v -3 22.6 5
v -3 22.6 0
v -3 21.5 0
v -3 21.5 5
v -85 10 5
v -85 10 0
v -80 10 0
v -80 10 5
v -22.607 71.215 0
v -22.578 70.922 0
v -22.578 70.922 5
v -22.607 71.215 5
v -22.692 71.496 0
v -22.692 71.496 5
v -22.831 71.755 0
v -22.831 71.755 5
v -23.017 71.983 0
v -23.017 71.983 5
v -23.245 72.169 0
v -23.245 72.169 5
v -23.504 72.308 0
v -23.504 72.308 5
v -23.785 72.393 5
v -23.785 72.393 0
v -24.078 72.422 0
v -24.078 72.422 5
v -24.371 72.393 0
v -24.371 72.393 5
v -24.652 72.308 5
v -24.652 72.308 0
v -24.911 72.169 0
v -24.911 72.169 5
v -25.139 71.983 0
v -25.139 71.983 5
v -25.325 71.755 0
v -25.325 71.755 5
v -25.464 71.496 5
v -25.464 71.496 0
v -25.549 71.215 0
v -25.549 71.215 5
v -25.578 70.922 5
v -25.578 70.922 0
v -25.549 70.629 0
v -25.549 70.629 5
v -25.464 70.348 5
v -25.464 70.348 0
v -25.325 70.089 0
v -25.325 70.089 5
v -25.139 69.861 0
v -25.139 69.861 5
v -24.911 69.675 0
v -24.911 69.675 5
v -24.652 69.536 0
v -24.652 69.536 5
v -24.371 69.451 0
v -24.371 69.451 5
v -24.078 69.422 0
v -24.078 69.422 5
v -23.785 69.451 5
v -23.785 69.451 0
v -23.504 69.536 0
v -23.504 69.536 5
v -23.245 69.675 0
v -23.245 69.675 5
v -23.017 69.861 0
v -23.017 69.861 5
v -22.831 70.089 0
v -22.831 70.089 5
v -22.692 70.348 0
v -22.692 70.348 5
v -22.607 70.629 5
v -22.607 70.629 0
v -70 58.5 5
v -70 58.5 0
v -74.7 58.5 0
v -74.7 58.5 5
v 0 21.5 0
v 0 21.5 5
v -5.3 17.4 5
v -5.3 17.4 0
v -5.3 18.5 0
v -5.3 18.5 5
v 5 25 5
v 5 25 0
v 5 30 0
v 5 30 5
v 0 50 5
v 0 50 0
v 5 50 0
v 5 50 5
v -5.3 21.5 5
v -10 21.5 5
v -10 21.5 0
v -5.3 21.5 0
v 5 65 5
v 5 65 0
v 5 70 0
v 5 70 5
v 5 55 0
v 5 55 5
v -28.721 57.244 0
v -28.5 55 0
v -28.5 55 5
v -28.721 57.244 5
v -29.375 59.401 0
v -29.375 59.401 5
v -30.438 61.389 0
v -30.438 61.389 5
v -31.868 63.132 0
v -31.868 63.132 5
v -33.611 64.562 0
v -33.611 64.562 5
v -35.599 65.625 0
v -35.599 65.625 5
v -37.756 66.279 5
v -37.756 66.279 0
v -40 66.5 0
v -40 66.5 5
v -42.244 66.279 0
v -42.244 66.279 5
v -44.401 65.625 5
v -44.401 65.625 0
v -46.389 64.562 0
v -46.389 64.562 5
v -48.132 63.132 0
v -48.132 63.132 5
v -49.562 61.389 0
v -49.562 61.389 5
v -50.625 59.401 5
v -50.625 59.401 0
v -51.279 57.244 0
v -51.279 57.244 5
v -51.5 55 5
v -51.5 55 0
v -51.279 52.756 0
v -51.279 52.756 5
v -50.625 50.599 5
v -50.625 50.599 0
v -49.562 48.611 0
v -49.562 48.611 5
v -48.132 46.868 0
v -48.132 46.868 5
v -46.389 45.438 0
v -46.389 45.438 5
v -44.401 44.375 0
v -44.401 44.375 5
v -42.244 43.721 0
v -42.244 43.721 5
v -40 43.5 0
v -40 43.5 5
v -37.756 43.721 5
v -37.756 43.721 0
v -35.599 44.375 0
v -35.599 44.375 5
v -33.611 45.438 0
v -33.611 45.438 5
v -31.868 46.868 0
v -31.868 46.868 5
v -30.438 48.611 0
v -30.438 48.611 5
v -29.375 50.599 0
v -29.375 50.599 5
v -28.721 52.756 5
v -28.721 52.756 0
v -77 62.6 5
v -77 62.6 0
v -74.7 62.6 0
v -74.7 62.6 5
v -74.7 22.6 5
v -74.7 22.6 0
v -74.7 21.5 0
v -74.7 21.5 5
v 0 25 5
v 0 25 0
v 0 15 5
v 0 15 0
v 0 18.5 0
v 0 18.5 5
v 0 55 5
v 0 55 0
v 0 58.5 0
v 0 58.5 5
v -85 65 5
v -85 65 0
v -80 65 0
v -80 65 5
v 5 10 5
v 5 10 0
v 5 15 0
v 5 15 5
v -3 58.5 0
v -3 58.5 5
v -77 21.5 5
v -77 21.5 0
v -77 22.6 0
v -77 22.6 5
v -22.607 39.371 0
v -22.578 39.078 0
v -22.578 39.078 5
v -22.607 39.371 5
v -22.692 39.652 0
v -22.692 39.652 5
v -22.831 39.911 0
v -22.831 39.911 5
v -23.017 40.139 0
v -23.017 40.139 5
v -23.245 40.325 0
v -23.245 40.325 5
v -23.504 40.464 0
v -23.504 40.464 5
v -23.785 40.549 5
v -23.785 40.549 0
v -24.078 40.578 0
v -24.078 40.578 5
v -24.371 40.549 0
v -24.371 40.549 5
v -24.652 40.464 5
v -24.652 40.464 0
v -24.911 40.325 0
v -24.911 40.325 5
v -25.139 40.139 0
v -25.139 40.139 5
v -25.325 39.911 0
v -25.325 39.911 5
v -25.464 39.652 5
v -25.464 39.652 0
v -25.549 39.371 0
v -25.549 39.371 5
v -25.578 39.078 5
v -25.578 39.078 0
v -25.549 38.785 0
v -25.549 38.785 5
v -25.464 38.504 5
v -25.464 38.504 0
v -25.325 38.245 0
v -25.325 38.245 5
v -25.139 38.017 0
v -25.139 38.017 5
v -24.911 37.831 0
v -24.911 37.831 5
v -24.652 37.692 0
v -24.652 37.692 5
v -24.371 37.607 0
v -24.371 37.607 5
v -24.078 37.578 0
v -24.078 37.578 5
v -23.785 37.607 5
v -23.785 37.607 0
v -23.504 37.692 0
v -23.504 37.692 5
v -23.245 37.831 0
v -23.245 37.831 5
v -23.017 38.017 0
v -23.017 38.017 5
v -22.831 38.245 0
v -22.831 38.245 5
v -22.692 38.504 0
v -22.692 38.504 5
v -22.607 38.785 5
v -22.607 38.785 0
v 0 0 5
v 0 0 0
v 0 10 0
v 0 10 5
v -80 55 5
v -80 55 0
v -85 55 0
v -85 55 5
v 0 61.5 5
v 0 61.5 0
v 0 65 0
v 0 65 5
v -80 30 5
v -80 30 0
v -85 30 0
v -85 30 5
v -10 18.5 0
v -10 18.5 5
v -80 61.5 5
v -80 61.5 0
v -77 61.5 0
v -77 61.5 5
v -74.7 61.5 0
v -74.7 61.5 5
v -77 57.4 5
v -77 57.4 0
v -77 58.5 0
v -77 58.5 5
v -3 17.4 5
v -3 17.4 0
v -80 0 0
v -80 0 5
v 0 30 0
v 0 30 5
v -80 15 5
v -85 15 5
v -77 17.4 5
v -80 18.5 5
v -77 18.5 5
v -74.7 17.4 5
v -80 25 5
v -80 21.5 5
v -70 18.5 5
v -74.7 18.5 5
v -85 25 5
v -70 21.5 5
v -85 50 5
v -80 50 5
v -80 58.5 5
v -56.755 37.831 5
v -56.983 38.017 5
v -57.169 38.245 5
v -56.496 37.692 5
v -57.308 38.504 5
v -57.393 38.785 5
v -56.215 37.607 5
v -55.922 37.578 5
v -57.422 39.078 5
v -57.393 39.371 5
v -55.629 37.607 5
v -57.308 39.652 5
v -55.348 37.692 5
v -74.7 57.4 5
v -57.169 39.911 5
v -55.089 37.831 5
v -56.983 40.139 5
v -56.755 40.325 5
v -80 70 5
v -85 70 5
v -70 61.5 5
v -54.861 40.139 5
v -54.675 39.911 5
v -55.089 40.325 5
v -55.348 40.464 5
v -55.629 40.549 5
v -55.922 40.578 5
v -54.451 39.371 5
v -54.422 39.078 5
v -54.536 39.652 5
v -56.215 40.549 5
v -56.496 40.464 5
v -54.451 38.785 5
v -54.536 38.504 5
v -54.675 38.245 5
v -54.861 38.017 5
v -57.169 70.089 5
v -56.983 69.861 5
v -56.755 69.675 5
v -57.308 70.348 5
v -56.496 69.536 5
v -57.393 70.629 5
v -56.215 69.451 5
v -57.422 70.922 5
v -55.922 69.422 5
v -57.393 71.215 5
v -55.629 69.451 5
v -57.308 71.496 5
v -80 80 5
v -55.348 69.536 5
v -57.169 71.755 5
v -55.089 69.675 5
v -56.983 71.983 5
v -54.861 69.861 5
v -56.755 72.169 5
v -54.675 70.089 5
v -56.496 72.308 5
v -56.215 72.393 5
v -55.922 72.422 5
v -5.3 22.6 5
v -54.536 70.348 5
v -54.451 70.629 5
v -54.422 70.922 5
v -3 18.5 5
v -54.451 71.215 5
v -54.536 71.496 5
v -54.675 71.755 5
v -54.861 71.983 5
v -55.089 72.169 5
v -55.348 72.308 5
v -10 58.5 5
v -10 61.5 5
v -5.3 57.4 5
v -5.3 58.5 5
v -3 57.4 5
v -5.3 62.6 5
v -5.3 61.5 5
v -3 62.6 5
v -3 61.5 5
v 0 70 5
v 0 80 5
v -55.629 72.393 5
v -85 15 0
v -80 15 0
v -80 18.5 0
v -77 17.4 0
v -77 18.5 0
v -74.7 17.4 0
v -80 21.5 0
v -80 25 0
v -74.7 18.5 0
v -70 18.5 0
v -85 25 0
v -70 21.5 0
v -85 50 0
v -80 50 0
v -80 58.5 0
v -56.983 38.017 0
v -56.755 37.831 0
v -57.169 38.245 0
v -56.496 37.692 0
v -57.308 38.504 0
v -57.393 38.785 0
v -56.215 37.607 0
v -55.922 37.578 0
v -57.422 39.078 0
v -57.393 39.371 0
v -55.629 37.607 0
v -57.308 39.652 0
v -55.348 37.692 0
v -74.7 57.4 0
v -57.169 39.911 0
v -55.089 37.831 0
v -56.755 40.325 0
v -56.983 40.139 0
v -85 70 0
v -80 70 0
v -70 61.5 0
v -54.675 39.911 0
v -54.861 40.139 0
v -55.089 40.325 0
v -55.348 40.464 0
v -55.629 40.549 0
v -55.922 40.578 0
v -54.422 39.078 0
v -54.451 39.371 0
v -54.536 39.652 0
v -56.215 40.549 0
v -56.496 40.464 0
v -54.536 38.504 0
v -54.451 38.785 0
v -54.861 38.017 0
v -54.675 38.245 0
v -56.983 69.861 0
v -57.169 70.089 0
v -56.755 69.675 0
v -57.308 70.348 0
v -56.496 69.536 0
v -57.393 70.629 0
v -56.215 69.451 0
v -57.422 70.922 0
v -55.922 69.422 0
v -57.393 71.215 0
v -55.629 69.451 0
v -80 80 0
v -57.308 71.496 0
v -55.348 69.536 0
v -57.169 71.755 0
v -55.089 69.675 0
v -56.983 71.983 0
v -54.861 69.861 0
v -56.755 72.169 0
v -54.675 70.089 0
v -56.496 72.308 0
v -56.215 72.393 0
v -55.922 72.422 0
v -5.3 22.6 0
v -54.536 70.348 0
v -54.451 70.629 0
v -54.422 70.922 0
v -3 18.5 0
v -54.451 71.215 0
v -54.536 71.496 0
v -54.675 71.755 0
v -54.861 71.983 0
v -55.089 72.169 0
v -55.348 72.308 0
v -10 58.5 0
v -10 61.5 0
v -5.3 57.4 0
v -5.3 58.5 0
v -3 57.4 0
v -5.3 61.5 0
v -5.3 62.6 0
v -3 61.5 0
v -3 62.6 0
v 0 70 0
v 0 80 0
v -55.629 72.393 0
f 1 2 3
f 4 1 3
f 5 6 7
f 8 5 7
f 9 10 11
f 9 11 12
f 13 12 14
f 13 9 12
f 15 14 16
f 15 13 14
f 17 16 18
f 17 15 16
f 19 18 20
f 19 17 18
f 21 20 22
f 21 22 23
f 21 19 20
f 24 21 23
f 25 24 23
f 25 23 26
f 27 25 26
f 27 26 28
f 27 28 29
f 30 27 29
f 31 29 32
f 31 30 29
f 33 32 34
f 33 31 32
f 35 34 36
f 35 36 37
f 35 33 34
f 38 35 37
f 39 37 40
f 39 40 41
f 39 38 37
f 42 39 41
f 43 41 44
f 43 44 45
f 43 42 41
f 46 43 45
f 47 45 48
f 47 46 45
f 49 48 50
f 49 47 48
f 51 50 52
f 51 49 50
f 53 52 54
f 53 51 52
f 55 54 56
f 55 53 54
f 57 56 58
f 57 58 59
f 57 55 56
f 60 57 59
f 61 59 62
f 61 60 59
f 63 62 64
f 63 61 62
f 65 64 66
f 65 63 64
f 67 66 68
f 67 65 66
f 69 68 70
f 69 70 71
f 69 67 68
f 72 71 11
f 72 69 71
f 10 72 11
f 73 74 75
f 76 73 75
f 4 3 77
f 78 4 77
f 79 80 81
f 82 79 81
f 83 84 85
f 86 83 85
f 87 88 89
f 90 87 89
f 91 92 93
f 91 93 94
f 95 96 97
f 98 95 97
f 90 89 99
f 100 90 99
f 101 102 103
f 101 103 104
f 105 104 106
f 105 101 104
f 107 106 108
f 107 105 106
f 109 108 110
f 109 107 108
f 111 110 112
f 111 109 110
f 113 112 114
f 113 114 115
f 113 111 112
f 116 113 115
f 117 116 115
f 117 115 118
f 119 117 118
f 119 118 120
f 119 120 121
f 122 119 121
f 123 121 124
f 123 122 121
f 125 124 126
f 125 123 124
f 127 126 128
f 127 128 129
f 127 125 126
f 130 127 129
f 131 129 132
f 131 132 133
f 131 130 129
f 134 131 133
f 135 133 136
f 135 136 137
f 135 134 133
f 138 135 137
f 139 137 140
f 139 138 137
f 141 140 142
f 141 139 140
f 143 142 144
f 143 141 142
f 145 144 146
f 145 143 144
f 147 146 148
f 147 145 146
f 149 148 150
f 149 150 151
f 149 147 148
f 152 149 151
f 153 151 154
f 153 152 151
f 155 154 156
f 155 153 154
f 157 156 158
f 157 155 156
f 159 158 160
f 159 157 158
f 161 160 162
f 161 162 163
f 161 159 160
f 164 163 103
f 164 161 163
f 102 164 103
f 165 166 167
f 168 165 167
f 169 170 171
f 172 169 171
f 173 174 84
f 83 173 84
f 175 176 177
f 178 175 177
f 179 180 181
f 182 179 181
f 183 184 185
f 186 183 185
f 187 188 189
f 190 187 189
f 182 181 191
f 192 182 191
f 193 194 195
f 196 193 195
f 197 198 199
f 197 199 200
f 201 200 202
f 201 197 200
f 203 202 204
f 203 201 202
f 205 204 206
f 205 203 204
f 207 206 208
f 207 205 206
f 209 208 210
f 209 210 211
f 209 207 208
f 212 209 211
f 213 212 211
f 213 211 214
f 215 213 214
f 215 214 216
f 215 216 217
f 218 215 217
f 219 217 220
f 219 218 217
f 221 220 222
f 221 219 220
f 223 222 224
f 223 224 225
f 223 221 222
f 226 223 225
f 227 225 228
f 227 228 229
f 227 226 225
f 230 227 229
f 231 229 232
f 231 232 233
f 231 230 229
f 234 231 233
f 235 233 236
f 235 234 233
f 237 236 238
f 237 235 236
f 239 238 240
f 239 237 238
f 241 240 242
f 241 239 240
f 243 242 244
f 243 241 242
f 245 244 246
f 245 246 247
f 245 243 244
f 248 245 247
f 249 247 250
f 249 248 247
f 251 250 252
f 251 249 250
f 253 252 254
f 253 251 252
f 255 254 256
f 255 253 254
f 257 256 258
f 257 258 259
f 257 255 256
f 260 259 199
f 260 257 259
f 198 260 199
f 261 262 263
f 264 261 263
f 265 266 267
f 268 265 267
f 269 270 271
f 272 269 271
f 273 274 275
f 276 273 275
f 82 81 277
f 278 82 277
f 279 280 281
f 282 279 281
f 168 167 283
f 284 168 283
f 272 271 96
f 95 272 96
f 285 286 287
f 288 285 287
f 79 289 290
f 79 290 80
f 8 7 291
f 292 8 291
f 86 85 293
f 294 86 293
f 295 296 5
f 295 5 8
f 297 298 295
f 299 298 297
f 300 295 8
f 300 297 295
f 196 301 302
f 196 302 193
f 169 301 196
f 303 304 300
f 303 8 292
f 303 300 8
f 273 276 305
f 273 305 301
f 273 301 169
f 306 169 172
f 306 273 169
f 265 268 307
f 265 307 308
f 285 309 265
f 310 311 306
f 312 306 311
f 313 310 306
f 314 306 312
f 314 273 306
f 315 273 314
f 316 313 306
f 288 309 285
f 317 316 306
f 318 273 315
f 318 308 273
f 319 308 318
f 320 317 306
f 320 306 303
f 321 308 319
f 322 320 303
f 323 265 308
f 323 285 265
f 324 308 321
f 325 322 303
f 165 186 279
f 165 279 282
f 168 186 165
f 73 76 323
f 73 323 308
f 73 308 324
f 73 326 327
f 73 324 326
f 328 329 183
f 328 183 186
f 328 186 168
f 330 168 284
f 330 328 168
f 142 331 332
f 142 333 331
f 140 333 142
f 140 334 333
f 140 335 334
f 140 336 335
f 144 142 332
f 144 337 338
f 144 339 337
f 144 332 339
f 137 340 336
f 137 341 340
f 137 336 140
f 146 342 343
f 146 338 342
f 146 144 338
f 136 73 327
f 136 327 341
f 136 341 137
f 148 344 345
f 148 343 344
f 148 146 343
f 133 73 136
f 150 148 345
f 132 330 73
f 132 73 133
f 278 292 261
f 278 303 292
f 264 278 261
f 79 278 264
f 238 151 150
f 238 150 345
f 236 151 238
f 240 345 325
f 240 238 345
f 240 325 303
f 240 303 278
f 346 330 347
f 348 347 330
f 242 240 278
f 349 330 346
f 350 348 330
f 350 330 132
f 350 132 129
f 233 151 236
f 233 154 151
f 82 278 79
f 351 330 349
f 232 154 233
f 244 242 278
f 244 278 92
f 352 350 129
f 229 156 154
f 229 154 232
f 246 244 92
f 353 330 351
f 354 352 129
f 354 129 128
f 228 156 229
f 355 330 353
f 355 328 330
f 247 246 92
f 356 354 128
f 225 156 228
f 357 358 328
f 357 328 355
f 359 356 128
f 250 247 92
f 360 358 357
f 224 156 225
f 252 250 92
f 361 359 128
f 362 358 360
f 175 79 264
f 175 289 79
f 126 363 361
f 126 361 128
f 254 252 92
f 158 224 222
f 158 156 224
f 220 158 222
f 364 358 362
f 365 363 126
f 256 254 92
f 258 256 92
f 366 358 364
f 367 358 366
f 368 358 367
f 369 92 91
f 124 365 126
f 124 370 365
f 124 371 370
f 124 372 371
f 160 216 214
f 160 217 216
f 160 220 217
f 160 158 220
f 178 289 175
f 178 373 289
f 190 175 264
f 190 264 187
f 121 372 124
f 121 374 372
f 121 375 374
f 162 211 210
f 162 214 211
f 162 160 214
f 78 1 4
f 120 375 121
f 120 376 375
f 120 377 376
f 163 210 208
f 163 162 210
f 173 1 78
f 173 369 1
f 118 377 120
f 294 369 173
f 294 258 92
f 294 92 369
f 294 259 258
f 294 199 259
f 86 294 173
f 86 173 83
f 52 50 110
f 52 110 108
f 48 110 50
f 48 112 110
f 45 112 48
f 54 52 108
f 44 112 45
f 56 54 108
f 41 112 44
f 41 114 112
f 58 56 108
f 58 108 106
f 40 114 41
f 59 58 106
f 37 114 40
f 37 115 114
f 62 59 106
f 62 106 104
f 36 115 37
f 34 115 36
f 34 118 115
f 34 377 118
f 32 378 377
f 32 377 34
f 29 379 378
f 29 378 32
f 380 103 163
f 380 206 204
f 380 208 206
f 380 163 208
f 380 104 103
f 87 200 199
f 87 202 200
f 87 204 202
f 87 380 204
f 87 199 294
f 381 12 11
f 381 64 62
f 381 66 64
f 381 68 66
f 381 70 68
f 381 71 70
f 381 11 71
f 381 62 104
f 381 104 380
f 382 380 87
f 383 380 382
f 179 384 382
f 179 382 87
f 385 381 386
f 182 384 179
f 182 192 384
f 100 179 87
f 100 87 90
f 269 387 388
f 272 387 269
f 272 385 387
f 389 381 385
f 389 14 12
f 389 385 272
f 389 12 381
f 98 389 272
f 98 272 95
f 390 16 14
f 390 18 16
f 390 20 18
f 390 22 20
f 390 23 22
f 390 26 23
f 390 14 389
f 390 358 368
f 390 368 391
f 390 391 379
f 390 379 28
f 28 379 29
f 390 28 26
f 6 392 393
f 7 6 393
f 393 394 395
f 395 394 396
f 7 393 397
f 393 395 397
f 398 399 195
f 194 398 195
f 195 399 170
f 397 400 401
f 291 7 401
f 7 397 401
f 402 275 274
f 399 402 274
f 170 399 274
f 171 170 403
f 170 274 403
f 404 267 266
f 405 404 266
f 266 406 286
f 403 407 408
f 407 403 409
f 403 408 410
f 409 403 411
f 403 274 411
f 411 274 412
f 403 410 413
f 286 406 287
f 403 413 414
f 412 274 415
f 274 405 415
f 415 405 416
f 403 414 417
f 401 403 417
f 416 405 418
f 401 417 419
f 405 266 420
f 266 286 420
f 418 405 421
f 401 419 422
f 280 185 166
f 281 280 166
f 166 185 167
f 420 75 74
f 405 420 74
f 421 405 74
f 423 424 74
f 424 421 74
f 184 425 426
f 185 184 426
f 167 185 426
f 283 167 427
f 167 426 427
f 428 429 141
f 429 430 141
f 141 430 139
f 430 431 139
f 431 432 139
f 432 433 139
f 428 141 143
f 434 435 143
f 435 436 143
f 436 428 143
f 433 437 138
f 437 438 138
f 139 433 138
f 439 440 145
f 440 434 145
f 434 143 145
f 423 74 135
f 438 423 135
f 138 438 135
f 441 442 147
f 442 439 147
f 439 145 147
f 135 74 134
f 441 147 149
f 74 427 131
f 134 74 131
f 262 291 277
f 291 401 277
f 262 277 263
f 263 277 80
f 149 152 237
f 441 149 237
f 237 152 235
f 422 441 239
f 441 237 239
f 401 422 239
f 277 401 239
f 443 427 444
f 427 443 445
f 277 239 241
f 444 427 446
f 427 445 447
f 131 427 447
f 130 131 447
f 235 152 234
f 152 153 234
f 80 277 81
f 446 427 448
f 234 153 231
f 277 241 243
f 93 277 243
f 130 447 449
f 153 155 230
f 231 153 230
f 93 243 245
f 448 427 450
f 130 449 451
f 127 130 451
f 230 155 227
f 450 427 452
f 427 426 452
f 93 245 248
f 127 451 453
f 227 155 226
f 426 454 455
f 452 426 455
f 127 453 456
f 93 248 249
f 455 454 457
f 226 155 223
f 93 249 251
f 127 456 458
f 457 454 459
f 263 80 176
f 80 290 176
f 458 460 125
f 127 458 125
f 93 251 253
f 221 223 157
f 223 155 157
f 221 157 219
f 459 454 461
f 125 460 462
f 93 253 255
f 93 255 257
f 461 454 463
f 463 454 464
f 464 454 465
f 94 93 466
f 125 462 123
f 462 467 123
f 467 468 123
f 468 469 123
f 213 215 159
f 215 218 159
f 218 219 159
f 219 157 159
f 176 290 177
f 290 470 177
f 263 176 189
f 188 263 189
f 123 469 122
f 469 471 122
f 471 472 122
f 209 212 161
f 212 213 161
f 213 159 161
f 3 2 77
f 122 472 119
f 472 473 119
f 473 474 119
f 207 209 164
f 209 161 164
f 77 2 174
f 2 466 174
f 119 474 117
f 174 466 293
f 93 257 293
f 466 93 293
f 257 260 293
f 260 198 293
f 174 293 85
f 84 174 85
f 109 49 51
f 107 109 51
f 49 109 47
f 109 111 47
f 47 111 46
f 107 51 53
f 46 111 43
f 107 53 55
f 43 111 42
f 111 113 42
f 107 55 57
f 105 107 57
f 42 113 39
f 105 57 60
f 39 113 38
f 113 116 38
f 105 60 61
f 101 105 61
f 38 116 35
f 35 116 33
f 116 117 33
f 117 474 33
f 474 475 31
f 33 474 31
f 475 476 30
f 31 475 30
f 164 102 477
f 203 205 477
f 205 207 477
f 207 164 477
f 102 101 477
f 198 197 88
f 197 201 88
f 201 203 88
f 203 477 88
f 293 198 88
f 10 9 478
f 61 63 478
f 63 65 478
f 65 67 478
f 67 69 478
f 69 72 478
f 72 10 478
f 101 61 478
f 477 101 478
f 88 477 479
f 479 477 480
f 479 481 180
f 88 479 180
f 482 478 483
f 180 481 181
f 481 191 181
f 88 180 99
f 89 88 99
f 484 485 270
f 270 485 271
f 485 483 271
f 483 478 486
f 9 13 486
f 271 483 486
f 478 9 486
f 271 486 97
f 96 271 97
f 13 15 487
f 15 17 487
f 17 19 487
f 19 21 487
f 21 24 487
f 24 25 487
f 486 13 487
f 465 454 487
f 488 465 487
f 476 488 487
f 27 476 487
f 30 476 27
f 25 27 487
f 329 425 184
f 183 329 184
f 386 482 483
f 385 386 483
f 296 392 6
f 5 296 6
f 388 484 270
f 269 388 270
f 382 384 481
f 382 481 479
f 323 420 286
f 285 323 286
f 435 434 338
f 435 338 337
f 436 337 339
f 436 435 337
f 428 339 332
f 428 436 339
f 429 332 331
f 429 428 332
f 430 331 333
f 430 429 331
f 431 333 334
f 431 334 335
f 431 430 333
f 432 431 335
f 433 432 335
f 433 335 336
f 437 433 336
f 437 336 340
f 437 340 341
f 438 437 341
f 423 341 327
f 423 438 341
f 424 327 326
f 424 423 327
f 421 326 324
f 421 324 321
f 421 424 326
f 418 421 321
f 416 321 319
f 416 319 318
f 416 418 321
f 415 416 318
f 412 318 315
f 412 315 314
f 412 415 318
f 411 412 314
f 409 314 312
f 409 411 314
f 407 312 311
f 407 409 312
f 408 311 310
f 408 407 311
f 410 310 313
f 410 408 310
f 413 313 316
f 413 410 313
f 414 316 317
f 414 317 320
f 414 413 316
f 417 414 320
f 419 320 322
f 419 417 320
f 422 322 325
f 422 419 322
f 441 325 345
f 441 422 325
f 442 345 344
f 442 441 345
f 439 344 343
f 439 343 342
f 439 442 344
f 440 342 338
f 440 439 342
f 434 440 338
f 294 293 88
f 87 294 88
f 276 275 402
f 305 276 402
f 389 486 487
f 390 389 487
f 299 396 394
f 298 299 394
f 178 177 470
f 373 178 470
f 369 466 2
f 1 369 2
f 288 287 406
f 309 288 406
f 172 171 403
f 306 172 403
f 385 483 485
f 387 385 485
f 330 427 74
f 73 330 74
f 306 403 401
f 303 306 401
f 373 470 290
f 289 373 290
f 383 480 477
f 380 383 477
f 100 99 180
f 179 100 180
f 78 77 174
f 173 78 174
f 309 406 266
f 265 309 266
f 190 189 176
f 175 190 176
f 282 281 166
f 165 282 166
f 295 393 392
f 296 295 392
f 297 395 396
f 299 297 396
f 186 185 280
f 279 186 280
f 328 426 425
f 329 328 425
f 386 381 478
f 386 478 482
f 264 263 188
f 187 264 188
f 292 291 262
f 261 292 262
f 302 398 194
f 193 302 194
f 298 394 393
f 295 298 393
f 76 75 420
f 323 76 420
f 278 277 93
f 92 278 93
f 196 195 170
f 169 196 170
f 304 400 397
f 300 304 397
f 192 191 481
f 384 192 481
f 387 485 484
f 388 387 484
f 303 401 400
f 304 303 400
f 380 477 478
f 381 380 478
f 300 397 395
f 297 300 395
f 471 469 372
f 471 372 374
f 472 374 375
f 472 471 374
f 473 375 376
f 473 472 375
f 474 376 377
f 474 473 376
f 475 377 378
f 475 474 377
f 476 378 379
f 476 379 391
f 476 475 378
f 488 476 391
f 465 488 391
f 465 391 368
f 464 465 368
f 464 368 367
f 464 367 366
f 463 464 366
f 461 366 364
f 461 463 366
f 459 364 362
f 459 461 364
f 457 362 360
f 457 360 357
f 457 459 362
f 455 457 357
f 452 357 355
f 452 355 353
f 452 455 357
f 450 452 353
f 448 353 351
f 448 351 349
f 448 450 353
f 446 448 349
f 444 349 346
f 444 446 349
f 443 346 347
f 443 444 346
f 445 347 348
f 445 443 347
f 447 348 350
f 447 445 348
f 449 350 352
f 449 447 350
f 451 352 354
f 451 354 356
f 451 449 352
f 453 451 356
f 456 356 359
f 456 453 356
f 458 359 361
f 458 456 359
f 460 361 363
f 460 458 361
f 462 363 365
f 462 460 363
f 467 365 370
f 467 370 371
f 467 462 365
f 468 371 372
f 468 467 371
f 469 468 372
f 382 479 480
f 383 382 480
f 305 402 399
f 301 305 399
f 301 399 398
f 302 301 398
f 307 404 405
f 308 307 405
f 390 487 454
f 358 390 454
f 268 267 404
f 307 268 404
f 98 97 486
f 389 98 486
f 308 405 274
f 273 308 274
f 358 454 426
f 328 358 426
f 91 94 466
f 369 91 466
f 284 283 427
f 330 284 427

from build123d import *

# Parameters (mm, degrees)
SKETCH1_R           = 1.5
SKETCH1_R_2         = 11.5
BOSS_EXTRUDE1_DEPTH = 5


with BuildPart() as part:
    # Sketch1 → Boss-Extrude1 (new body)
    with BuildSketch(Plane.XY):
        Polygon((0, 80), (-80, 80), (-80, 70), (-85, 70), (-85, 65), (-80, 65), (-80, 61.5), (-77, 61.5), (-77, 62.6), (-74.7, 62.6), (-74.7, 61.5), (-70, 61.5), (-70, 58.5), (-74.7, 58.5), (-74.7, 57.4), (-77, 57.4), (-77, 58.5), (-80, 58.5), (-80, 55), (-85, 55), (-85, 50), (-80, 50), (-80, 30), (-85, 30), (-85, 25), (-80, 25), (-80, 21.5), (-77, 21.5), (-77, 22.6), (-74.7, 22.6), (-74.7, 21.5), (-70, 21.5), (-70, 18.5), (-74.7, 18.5), (-74.7, 17.4), (-77, 17.4), (-77, 18.5), (-80, 18.5), (-80, 15), (-85, 15), (-85, 10), (-80, 10), (-80, 0), (0, 0), (0, 10), (5, 10), (5, 15), (0, 15), (0, 18.5), (-3, 18.5), (-3, 17.4), (-5.3, 17.4), (-5.3, 18.5), (-10, 18.5), (-10, 21.5), (-5.3, 21.5), (-5.3, 22.6), (-3, 22.6), (-3, 21.5), (0, 21.5), (0, 25), (5, 25), (5, 30), (0, 30), (0, 50), (5, 50), (5, 55), (0, 55), (0, 58.5), (-3, 58.5), (-3, 57.4), (-5.3, 57.4), (-5.3, 58.5), (-10, 58.5), (-10, 61.5), (-5.3, 61.5), (-5.3, 62.6), (-3, 62.6), (-3, 61.5), (0, 61.5), (0, 65), (5, 65), (5, 70), (0, 70), align=None)
        with Locations((-55.922, 70.922)):
            Circle(SKETCH1_R, mode=Mode.SUBTRACT)
        with Locations((-24.078, 70.922)):
            Circle(SKETCH1_R, mode=Mode.SUBTRACT)
        with Locations((-24.078, 39.078)):
            Circle(SKETCH1_R, mode=Mode.SUBTRACT)
        with Locations((-55.922, 39.078)):
            Circle(SKETCH1_R, mode=Mode.SUBTRACT)
        with Locations((-40, 55)):
            Circle(SKETCH1_R_2, mode=Mode.SUBTRACT)
    extrude(amount=BOSS_EXTRUDE1_DEPTH)


solid = part.part
